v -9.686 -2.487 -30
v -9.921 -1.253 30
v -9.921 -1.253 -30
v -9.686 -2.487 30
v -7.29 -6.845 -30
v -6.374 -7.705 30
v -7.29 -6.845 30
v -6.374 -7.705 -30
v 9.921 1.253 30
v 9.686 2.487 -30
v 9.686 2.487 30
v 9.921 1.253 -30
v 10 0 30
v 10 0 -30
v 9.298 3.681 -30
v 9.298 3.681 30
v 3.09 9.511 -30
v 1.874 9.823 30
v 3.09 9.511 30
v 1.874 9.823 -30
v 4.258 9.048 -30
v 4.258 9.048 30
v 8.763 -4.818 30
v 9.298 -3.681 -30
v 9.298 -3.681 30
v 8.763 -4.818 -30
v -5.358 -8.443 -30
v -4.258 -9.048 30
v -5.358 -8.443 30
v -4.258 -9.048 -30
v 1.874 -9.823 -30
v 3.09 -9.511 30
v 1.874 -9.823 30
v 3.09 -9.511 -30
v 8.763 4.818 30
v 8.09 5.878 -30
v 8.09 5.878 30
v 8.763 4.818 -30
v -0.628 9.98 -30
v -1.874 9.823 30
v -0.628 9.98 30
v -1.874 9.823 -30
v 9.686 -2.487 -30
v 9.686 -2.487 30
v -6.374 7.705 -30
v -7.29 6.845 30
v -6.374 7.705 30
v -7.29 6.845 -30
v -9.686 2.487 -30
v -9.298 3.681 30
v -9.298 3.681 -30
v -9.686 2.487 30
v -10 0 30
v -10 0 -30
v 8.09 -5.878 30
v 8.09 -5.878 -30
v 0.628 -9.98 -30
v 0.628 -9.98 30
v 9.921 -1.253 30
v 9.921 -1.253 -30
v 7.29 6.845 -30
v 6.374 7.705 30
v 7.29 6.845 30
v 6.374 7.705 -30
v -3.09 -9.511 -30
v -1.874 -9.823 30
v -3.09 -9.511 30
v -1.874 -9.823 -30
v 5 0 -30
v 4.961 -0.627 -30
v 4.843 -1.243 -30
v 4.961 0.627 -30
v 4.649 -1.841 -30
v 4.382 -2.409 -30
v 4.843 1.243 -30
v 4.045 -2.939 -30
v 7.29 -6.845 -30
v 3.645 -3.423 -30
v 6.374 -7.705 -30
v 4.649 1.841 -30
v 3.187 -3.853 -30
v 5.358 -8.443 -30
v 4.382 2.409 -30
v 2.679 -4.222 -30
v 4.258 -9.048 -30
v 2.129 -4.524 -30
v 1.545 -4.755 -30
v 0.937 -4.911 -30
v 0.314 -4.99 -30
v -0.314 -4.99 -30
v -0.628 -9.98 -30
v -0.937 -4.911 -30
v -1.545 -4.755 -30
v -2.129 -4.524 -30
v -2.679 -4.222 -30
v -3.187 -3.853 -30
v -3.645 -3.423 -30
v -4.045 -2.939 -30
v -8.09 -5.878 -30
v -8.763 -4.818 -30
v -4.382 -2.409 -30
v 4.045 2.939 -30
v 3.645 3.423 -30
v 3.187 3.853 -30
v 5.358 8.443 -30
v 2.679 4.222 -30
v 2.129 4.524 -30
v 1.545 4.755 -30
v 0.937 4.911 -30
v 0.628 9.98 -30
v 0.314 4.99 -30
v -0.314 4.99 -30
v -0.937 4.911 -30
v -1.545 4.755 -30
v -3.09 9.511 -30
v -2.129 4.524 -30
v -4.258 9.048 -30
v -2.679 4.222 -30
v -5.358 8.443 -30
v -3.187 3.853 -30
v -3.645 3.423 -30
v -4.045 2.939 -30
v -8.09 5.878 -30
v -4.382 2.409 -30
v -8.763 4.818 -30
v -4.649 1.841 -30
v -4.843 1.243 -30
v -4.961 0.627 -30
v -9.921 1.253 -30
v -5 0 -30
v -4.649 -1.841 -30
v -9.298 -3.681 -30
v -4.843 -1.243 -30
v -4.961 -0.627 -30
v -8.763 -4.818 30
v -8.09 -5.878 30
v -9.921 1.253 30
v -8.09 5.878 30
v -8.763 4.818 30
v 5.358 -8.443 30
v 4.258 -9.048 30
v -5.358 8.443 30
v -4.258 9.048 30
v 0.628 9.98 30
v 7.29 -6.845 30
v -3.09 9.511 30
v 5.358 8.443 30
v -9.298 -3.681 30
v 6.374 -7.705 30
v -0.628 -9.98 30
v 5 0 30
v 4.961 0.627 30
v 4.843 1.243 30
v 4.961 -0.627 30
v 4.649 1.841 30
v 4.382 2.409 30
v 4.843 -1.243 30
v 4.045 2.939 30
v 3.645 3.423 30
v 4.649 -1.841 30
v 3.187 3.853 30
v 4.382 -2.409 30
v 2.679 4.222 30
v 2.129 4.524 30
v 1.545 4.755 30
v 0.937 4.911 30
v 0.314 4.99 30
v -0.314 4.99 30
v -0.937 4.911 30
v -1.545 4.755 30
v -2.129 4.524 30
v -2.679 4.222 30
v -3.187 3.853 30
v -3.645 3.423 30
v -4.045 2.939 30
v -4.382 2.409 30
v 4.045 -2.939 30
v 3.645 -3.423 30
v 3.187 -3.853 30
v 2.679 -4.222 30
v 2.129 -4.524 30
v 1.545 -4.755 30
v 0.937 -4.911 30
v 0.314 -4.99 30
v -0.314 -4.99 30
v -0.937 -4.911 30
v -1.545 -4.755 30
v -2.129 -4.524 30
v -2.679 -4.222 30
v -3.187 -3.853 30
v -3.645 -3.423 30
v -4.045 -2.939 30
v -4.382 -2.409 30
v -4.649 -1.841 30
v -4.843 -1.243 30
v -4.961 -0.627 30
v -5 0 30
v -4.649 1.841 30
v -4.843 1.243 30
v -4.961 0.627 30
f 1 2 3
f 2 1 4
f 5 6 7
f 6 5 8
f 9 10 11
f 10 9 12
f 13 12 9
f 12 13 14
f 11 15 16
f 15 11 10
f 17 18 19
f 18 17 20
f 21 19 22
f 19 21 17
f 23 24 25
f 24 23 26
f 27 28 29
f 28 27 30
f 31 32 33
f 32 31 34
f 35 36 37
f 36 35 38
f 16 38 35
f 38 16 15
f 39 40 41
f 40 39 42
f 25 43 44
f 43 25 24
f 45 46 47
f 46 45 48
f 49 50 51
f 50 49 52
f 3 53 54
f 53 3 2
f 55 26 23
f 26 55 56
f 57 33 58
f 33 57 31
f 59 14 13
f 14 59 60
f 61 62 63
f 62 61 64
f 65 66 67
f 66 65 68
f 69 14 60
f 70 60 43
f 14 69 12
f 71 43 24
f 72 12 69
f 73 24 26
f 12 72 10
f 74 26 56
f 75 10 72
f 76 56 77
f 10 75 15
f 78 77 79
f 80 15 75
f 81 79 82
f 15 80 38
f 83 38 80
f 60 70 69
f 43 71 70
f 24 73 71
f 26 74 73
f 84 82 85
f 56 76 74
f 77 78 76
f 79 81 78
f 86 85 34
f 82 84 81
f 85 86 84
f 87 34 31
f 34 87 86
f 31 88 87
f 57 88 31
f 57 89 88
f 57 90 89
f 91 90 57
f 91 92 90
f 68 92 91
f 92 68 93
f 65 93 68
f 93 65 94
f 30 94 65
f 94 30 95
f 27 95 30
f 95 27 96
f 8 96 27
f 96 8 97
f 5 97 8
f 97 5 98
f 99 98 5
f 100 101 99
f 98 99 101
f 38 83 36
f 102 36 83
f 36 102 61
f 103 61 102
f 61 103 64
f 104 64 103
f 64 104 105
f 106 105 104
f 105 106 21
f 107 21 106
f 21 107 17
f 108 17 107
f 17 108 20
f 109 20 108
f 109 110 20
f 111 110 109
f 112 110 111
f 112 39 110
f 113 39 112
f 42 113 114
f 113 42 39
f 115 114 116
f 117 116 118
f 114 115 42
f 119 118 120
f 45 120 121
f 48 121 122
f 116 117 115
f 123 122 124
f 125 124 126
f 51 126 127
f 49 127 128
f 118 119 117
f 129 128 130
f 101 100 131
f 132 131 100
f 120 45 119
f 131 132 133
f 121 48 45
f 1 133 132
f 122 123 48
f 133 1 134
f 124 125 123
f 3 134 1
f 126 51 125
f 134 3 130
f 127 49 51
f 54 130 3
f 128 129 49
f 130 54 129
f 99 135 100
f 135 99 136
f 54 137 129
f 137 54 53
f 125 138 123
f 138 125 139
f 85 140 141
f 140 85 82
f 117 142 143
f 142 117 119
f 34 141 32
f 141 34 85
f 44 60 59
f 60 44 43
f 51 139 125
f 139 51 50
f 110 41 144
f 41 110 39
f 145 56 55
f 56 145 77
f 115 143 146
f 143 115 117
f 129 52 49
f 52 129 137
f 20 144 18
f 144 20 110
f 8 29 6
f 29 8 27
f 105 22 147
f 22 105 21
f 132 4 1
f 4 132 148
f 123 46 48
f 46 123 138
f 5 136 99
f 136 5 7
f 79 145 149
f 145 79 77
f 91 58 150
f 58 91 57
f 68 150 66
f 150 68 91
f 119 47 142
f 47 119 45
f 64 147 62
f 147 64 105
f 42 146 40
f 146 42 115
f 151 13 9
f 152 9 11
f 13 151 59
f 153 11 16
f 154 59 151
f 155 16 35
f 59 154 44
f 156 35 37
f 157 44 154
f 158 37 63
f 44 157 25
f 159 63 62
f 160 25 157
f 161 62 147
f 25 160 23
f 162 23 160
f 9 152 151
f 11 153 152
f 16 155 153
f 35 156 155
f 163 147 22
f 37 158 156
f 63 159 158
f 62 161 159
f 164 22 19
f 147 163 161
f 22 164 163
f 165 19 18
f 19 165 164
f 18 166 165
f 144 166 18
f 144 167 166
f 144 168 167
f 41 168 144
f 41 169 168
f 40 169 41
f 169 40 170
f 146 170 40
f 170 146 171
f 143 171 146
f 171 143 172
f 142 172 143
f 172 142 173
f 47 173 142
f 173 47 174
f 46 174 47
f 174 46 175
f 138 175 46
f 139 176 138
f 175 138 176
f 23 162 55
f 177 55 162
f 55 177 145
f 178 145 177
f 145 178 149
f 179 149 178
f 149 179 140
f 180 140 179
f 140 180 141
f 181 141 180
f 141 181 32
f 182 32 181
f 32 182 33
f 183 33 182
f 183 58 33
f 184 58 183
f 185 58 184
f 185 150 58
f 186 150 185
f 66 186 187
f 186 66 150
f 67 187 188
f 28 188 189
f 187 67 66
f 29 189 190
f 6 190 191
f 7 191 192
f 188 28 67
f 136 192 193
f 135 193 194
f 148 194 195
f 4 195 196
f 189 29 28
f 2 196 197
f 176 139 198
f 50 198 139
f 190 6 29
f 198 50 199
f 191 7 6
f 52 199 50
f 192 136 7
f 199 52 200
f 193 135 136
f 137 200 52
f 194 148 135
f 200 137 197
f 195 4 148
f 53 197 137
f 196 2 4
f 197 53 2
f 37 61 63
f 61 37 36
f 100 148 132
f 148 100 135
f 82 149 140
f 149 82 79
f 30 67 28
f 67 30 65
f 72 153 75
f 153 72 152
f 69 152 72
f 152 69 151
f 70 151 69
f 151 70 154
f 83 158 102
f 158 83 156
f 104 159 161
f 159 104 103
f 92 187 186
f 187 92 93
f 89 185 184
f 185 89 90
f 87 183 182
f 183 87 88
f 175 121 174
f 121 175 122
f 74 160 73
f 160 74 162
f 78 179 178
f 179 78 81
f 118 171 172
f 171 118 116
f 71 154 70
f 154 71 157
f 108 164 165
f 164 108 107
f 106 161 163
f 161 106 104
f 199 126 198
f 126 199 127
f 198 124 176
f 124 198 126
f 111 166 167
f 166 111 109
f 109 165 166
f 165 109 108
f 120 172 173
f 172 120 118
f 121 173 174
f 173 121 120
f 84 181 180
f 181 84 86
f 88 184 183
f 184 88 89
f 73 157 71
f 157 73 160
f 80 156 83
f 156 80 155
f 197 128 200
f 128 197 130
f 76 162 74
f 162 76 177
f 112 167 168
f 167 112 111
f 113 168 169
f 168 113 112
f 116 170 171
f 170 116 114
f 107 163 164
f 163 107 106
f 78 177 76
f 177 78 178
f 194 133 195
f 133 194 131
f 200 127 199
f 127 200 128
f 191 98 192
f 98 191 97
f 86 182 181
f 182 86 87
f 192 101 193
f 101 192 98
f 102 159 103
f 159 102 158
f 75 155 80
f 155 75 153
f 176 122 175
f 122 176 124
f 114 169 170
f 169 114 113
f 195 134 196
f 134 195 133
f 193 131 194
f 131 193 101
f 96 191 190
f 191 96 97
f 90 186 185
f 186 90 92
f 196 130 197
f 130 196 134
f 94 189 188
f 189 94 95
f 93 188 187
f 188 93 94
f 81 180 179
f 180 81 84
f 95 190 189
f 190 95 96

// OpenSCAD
$fn = 50;


difference() {
	union() {
		translate(v = [0, 0, -30.0000000000]) {
			cylinder(h = 60, r = 10.0000000000);
		}
	}
	union() {
		translate(v = [0, 0, -100.0000000000]) {
			cylinder(h = 200, r = 5.0000000000);
		}
	}
}
